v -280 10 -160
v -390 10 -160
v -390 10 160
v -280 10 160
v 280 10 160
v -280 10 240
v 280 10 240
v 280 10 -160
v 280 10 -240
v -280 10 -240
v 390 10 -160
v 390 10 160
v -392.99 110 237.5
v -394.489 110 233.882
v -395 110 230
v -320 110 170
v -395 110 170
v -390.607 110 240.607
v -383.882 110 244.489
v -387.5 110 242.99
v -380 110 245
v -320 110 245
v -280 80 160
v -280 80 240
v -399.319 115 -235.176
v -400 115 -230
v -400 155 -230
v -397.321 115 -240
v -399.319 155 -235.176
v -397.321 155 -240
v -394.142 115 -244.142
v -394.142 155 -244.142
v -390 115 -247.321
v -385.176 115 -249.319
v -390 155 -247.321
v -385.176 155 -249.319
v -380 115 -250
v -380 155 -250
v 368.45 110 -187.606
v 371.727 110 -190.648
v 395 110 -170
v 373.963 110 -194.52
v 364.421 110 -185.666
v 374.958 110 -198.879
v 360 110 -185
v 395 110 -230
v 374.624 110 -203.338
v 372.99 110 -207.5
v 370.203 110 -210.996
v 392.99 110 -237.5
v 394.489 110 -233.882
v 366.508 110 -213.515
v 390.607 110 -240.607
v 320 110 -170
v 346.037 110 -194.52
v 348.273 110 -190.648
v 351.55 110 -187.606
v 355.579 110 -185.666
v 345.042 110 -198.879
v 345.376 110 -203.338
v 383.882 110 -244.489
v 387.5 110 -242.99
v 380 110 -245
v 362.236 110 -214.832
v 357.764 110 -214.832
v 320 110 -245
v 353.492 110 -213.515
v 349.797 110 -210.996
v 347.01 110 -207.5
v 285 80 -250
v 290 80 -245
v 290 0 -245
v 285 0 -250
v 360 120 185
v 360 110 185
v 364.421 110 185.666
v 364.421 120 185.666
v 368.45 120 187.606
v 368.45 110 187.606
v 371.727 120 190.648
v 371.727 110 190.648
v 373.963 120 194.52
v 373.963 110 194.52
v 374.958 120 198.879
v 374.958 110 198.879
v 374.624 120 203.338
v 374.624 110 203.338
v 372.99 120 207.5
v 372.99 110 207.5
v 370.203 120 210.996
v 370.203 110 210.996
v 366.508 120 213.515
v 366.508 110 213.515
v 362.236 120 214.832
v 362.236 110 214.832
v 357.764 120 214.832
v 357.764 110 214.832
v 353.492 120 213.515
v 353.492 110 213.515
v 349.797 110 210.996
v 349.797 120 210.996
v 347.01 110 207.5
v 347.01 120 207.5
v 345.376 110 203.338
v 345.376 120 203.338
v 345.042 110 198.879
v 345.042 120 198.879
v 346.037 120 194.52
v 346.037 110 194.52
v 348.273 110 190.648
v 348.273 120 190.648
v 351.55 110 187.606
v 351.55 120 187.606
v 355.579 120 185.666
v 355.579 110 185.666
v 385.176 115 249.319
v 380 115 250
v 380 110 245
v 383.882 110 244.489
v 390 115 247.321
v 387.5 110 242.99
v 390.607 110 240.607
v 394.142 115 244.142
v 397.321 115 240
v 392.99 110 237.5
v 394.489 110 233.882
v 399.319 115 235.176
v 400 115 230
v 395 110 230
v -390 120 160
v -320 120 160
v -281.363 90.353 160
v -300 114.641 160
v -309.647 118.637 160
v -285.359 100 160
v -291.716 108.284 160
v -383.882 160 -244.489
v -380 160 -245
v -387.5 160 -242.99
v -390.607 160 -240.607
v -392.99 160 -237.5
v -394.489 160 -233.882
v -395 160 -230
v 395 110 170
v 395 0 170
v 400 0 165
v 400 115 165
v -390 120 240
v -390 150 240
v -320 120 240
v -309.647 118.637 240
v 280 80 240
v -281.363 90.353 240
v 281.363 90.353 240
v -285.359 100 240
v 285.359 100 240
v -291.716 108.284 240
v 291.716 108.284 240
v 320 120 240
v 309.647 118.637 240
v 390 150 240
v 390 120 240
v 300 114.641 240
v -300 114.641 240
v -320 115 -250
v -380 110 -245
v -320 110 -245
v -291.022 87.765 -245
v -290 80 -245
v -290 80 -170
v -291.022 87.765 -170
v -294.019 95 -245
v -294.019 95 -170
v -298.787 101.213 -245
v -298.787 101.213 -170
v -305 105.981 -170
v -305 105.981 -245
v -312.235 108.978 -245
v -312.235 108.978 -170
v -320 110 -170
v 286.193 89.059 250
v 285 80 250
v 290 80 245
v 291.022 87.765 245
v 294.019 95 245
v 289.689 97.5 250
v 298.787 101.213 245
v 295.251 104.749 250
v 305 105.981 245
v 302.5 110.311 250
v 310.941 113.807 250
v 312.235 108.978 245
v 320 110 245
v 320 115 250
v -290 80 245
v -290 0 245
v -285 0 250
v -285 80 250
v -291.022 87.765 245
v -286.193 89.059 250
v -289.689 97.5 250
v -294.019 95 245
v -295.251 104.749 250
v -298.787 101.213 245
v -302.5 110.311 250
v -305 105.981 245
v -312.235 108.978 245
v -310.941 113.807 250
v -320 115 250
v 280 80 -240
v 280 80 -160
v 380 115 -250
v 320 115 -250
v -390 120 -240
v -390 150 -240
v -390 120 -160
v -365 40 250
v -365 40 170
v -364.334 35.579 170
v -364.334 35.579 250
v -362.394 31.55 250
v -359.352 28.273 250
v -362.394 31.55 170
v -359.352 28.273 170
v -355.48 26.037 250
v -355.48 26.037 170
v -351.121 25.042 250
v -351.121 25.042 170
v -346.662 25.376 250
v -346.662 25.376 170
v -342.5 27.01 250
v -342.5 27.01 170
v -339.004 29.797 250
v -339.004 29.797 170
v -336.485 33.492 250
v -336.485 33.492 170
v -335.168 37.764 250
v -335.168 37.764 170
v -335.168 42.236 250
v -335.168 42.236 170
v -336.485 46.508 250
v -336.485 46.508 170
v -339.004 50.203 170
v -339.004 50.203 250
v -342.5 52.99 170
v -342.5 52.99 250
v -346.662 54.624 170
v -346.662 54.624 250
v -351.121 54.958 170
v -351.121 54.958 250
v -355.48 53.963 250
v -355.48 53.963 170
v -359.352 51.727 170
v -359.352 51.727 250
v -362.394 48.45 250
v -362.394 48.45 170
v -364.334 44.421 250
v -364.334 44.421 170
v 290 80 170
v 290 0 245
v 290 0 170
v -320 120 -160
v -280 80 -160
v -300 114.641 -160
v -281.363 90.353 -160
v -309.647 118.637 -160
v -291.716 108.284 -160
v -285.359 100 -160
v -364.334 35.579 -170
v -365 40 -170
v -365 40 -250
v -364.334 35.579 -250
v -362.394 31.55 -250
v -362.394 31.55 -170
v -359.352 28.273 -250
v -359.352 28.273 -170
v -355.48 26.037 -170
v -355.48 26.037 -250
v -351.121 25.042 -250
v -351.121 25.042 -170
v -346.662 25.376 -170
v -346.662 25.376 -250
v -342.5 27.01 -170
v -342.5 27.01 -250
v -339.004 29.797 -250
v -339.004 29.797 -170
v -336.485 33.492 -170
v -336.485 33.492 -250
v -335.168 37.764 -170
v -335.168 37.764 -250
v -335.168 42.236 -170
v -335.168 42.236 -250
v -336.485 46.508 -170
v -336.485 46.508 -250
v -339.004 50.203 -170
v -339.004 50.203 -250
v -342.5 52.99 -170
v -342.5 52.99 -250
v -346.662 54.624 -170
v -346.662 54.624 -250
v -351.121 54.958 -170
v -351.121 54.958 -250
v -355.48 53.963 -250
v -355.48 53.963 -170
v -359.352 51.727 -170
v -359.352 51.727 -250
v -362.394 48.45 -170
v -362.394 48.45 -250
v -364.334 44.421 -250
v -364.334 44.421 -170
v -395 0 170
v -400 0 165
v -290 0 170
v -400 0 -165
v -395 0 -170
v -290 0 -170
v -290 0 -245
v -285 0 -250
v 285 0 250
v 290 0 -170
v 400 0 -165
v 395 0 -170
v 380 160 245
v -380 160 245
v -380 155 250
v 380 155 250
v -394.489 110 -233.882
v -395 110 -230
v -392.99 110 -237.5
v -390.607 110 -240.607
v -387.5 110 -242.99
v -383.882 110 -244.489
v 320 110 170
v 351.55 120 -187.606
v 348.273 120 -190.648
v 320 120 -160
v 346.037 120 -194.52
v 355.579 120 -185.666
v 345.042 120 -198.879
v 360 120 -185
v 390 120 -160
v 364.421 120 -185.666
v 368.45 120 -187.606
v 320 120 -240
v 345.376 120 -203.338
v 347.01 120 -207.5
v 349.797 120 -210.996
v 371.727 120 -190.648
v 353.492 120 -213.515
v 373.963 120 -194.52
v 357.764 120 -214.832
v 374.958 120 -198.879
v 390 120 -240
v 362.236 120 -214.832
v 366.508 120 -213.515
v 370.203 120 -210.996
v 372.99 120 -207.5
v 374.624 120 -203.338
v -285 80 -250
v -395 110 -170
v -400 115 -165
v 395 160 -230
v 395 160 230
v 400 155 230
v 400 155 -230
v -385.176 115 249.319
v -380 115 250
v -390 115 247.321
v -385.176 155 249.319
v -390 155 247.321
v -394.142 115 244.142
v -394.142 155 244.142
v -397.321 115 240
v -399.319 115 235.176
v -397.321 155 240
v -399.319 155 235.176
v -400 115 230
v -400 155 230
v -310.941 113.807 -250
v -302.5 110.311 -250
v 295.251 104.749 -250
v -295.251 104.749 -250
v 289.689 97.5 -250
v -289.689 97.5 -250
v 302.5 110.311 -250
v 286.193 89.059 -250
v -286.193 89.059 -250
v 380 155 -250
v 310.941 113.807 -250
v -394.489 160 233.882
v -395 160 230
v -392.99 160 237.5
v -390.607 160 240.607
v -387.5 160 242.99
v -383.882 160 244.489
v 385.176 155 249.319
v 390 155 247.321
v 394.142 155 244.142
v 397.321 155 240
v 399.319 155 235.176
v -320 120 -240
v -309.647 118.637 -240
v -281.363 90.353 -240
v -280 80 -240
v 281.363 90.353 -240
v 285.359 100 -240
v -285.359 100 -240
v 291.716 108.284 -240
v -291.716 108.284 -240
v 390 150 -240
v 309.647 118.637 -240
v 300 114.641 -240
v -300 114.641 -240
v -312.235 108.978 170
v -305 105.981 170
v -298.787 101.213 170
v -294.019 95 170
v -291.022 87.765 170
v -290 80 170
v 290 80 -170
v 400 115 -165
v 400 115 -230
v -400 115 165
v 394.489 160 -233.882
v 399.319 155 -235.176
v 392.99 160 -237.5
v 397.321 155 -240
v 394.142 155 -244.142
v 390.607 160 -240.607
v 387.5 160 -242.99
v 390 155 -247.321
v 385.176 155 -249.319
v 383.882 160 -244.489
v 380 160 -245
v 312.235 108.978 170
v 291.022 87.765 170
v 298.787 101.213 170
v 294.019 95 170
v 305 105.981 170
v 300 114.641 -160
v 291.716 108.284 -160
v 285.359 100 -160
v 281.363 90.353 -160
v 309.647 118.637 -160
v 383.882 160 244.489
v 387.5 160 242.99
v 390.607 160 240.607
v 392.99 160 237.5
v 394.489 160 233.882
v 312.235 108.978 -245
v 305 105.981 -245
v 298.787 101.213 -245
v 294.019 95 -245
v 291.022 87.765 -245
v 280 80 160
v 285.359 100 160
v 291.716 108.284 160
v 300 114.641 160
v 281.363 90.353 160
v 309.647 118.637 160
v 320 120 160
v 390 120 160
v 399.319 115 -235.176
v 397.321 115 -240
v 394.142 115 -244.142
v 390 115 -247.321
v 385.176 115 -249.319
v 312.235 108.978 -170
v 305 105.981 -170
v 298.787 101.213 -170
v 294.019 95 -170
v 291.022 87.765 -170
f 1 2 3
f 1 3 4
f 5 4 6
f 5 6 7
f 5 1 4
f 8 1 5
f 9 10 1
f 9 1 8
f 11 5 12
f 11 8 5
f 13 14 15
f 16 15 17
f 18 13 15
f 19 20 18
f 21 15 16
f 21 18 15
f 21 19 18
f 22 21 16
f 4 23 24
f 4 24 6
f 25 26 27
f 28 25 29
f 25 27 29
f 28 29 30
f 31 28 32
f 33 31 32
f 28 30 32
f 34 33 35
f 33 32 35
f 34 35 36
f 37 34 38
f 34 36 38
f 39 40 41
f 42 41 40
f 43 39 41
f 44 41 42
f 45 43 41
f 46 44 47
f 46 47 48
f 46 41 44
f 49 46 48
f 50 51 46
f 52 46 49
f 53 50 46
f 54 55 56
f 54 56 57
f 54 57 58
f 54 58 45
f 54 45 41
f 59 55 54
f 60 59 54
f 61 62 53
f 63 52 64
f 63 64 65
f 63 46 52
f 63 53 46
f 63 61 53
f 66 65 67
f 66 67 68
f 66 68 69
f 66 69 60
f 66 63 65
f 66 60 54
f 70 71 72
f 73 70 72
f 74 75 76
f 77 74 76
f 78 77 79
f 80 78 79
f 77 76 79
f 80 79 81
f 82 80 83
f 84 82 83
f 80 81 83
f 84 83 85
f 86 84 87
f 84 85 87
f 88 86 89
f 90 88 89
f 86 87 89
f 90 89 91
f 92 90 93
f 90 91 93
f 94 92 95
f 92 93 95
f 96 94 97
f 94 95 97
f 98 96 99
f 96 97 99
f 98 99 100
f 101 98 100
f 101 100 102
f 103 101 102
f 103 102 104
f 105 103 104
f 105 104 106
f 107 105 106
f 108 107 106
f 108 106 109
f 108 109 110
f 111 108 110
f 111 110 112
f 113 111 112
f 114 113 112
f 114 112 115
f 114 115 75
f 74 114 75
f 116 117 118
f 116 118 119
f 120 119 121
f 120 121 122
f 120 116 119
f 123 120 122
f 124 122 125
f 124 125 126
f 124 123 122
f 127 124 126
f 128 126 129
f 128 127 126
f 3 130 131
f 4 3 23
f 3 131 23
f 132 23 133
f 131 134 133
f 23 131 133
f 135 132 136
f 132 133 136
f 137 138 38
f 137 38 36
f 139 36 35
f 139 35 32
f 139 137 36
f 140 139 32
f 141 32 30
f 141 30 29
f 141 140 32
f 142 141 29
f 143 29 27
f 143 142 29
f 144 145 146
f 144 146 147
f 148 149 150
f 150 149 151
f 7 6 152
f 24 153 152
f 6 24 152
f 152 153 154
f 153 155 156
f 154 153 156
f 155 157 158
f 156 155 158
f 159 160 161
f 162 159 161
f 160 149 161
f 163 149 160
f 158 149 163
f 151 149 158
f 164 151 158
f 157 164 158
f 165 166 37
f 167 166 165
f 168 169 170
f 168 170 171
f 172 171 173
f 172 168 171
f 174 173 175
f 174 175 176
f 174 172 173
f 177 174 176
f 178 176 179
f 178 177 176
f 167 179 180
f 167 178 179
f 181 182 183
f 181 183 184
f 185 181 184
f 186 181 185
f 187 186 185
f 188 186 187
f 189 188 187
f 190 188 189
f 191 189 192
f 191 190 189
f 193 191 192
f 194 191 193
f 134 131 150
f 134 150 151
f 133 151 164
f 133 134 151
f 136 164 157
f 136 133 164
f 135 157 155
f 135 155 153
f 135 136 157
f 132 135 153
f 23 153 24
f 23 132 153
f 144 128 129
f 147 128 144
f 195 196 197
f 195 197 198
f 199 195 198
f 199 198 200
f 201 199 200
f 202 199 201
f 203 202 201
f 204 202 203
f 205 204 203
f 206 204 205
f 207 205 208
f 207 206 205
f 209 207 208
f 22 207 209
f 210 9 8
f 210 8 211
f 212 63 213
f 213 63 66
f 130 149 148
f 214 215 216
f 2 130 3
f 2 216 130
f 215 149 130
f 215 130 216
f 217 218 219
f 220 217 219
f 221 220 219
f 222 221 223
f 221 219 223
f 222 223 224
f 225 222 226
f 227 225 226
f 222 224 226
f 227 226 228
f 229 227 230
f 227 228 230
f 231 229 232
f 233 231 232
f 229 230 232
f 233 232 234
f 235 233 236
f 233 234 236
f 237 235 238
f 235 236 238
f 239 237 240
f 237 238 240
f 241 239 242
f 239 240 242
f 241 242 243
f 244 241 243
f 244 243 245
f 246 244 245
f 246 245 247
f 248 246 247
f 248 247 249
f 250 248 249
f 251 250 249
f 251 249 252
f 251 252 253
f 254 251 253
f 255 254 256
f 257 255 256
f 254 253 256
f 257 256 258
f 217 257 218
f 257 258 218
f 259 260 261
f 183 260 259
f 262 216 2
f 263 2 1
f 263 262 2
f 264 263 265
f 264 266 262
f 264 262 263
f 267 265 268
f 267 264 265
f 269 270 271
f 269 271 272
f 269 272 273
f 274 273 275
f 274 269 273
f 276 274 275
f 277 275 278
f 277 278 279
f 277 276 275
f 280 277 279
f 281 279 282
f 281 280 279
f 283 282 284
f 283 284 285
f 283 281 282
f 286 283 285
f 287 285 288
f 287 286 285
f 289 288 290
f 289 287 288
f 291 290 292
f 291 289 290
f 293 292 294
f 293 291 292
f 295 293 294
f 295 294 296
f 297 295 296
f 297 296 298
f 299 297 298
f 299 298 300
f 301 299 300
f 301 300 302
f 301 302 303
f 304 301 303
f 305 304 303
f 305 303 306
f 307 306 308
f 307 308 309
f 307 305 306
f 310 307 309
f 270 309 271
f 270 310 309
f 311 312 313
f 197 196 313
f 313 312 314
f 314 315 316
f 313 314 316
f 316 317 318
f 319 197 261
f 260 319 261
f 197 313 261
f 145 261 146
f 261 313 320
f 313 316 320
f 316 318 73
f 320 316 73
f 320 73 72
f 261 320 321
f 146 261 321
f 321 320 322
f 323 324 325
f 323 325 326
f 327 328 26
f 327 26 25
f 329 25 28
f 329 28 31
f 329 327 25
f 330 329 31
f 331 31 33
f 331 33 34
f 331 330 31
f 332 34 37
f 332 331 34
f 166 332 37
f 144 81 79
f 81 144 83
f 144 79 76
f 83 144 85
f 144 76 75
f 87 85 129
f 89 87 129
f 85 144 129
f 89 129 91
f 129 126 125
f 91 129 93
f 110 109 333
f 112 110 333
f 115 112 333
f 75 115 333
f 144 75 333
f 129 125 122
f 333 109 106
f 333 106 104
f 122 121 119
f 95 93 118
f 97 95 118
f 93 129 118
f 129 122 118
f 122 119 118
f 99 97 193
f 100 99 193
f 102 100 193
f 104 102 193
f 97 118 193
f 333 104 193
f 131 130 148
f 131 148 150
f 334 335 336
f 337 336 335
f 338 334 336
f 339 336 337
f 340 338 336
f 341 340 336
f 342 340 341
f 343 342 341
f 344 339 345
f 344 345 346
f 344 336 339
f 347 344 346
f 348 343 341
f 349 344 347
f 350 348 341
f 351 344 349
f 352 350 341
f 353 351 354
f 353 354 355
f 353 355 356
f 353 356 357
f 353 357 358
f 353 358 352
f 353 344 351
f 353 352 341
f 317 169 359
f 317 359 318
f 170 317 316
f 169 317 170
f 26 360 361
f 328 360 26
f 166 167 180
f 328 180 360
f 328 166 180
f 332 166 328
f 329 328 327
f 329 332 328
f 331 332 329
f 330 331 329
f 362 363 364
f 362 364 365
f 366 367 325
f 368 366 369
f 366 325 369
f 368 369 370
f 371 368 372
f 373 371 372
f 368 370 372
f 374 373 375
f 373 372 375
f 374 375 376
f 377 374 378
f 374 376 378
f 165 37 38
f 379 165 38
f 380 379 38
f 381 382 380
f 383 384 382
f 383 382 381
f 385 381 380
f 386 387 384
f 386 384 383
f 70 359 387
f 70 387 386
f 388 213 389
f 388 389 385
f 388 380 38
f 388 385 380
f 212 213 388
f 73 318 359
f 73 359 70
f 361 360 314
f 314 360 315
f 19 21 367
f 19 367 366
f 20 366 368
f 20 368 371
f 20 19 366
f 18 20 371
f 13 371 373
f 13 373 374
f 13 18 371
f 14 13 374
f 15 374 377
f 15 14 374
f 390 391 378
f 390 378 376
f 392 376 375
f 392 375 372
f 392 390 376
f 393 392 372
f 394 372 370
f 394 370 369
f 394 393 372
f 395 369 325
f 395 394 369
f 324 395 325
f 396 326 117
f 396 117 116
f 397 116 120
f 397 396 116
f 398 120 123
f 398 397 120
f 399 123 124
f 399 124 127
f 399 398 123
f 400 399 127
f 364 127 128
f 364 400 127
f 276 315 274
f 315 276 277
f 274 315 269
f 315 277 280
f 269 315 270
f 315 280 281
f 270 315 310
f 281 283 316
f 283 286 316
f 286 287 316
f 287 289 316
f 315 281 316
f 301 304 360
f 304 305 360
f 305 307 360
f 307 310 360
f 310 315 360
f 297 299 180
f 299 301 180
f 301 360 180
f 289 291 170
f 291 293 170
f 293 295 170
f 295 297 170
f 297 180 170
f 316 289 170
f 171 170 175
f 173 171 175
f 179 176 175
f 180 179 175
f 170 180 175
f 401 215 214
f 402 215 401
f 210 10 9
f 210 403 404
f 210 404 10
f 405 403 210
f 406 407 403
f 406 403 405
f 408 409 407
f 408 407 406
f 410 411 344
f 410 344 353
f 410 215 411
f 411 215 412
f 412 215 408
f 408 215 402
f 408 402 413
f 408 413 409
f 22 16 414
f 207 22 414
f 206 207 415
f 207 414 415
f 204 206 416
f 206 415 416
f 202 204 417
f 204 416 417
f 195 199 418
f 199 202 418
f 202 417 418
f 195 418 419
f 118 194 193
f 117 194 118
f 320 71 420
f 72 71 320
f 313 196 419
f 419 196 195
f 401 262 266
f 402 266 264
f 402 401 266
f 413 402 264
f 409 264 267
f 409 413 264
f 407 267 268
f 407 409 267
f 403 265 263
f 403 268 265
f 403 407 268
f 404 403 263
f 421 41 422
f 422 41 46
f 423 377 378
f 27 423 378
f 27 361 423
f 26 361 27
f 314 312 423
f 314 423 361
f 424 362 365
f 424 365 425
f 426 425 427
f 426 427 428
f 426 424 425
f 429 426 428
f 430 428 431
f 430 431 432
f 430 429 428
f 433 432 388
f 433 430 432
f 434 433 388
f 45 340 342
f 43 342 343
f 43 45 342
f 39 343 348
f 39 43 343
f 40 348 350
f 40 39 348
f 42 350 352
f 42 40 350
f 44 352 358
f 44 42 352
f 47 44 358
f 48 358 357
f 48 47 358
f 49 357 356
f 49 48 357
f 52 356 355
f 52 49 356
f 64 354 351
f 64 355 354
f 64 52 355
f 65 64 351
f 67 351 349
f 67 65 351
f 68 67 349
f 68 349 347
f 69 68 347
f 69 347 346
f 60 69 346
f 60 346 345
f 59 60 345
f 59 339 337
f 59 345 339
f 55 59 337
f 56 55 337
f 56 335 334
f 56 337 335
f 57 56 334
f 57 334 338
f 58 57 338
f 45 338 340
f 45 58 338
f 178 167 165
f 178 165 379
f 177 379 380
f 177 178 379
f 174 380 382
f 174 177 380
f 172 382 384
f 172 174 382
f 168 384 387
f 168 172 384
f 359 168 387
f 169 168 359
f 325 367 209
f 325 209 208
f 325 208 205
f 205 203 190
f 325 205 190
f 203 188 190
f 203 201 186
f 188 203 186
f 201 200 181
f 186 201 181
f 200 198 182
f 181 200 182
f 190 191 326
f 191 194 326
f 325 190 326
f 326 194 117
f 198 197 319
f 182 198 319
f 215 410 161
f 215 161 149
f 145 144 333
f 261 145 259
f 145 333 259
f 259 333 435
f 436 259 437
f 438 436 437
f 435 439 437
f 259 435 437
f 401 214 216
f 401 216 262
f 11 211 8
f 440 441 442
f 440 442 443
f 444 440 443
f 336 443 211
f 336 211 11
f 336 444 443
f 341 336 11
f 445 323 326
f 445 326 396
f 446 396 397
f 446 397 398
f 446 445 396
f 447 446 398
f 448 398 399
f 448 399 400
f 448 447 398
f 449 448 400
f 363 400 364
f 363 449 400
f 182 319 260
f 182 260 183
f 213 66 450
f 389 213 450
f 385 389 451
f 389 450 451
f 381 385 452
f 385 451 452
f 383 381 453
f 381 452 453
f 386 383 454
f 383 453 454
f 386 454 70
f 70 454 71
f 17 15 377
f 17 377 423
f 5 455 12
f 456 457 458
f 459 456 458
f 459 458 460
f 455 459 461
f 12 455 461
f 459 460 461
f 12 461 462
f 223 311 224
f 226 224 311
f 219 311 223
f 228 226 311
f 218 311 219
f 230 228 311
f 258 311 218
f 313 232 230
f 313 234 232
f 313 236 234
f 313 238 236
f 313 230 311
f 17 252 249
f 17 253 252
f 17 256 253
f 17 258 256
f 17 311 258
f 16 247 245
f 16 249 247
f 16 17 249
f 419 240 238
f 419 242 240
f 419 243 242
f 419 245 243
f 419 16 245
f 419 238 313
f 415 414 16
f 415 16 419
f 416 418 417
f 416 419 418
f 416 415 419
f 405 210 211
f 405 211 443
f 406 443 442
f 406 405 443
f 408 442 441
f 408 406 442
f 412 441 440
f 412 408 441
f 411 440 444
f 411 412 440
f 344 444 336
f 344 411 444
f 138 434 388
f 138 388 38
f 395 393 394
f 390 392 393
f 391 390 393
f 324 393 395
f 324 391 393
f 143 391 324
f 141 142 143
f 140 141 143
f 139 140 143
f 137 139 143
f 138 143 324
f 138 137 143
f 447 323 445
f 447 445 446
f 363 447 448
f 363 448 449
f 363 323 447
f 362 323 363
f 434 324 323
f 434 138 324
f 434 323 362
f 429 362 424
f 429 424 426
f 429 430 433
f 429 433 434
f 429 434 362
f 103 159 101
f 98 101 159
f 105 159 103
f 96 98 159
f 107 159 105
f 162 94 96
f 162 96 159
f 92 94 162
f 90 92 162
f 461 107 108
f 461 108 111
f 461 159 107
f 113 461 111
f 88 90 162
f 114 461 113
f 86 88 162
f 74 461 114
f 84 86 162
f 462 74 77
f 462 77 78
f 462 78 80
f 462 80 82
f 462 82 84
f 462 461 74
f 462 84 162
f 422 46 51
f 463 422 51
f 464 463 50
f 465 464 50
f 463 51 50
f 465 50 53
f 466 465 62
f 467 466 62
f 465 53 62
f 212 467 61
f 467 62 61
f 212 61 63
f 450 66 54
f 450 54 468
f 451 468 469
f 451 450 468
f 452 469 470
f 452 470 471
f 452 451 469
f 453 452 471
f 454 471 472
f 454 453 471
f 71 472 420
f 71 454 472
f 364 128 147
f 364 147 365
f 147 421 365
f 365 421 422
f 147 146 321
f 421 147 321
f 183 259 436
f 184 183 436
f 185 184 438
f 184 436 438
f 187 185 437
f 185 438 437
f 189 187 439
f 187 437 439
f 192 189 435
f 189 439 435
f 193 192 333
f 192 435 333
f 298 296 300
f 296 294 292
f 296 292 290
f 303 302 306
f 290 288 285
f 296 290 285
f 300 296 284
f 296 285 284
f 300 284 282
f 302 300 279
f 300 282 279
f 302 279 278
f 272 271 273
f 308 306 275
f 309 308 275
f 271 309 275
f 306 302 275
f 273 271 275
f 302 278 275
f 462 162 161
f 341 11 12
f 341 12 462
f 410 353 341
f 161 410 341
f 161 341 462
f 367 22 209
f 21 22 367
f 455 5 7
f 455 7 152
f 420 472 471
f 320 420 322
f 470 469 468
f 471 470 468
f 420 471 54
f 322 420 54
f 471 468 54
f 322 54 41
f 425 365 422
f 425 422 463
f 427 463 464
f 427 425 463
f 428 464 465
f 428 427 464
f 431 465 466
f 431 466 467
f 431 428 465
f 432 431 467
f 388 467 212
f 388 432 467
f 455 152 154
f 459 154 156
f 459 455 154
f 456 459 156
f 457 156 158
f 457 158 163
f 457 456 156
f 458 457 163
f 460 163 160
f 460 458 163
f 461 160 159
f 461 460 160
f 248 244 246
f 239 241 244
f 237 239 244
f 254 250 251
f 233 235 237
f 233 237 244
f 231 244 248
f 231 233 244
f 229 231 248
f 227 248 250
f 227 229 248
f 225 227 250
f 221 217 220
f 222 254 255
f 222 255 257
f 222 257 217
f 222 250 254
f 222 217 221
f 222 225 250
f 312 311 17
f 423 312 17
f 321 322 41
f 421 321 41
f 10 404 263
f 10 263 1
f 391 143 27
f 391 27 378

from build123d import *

# Parameters (mm, degrees)
SKETCH1_W            = 800
SKETCH1_H            = 500
BOSS_EXTRUDE1_DEPTH  = 160
SKETCH3_W            = 110
SKETCH3_H            = 110
CUT_EXTRUDE1_DEPTH   = 80
FILLET1_R            = 30
FILLET1_OF_MIRROR1_R = 30
MIRROR2_START        = -250
MIRROR2_DEPTH        = 80
SHELL2_START         = -240
SHELL2_DEPTH         = 480
SHELL2_START_2       = -160
SHELL2_2_DEPTH       = 320
FILLET2_R            = 20
CHAMFER1_SIZE        = 5
CHAMFER2_SIZE        = 5
SKETCH7_R            = 15
BOSS_EXTRUDE2_DEPTH  = 80
SKETCH8_R            = 15
CUT_EXTRUDE2_DEPTH   = 20


# Read off the part's stored shape, not the designer's step: Mirror2, Shell2
with BuildPart() as part:
    # Sketch1 → Boss-Extrude1 (new body)
    with BuildSketch(Plane(origin=(0, 0, 0), x_dir=(1, 0, 0), z_dir=(0, 1, 0))):
        Rectangle(SKETCH1_W, SKETCH1_H)
    extrude(amount=BOSS_EXTRUDE1_DEPTH)

    # Sketch3 → Cut-Extrude1 (cut)
    with BuildSketch(Plane.XY.offset(250)):
        with Locations((-345, 55)):
            Rectangle(SKETCH3_W, SKETCH3_H)
    cut_extrude1 = extrude(amount=-CUT_EXTRUDE1_DEPTH, mode=Mode.SUBTRACT)

    # Fillet1
    fillet1_edges = [part.edges().sort_by_distance(p)[0] for p in [
        (-290, 110, 210),
    ]]
    fillet(fillet1_edges, radius=FILLET1_R)

    # Mirror1: Cut-Extrude1 across plane
    add(cut_extrude1.mirror(Plane(origin=(0, 0, 0), x_dir=(0, 0, 1), z_dir=(1, 0, 0))), mode=Mode.SUBTRACT)

    # Fillet1 of Mirror1
    fillet1_of_mirror1_edges = [part.edges().sort_by_distance(p)[0] for p in [
        (290, 110, 210),
    ]]
    fillet(fillet1_of_mirror1_edges, radius=FILLET1_OF_MIRROR1_R)

    # Mirror2 outline → Mirror2 (cut)
    with BuildSketch(Plane.XY.offset(MIRROR2_START)):
        with BuildLine():
            Line((400, 0), (400, 110))
            Line((400, 110), (320, 110))
            ThreePointArc((320, 110), (298.786796564, 101.213203436), (290, 80))
            Line((290, 80), (290, 0))
            Line((290, 0), (400, 0))
        make_face()
        with BuildLine():
            Line((-400, 0), (-290, 0))
            Line((-290, 0), (-290, 80))
            ThreePointArc((-290, 80), (-298.786796564, 101.213203436), (-320, 110))
            Line((-320, 110), (-400, 110))
            Line((-400, 110), (-400, 0))
        make_face()
    extrude(amount=MIRROR2_DEPTH, mode=Mode.SUBTRACT)

    # Shell2 outline → Shell2 (cut)
    with BuildSketch(Plane.XY.offset(SHELL2_START)):
        with BuildLine():
            Line((-280, 10), (280, 10))
            Line((280, 10), (280, 80))
            ThreePointArc((280, 80), (291.715728753, 108.284271247), (320, 120))
            Line((320, 120), (390, 120))
            Line((390, 120), (390, 150))
            Line((390, 150), (-390, 150))
            Line((-390, 150), (-390, 120))
            Line((-390, 120), (-320, 120))
            ThreePointArc((-320, 120), (-291.715728753, 108.284271247), (-280, 80))
            Line((-280, 80), (-280, 10))
        make_face()
    extrude(amount=SHELL2_DEPTH, mode=Mode.SUBTRACT)

    # Shell2 2 outline → Shell2 2 (cut)
    with BuildSketch(Plane.XY.offset(SHELL2_START_2)):
        with BuildLine():
            Line((280, 10), (390, 10))
            Line((390, 10), (390, 120))
            Line((390, 120), (320, 120))
            ThreePointArc((320, 120), (291.715728753, 108.284271247), (280, 80))
            Line((280, 80), (280, 10))
        make_face()
        with BuildLine():
            Line((-390, 10), (-280, 10))
            Line((-280, 10), (-280, 80))
            ThreePointArc((-280, 80), (-291.715728753, 108.284271247), (-320, 120))
            Line((-320, 120), (-390, 120))
            Line((-390, 120), (-390, 10))
        make_face()
    extrude(amount=SHELL2_2_DEPTH, mode=Mode.SUBTRACT)

    # Fillet2
    fillet2_edges = [part.edges().sort_by_distance(p)[0] for p in [
        (400, 135, 250),
        (-400, 135, 250),
        (-400, 135, -250),
        (400, 135, -250),
    ]]
    fillet(fillet2_edges, radius=FILLET2_R)

    # Chamfer1
    chamfer1_edges = [part.edges().sort_by_distance(p)[0] for p in [
        (-394.142135624, 110, 244.142135624),
        (394.142135624, 110, 244.142135624),
        (394.142135624, 110, -244.142135624),
        (-394.142135624, 110, -244.142135624),
        (-400, 55, 170),
        (-400, 110, 200),
        (-290, 40, 250),
        (-350, 110, 250),
        (-298.786796564, 101.213203436, 250),
        (400, 110, 200),
        (290, 40, 250),
        (400, 55, 170),
        (350, 110, 250),
        (298.786796564, 101.213203436, 250),
        (400, 55, -170),
        (400, 110, -200),
        (290, 40, -250),
        (350, 110, -250),
        (298.786796564, 101.213203436, -250),
        (-400, 110, -200),
        (-290, 40, -250),
        (-400, 55, -170),
        (-350, 110, -250),
        (-298.786796564, 101.213203436, -250),
    ]]
    chamfer(chamfer1_edges, length=CHAMFER1_SIZE)

    # Chamfer2
    chamfer2_edges = [part.edges().sort_by_distance(p)[0] for p in [
        (0, 160, 250),
        (-400, 160, 0),
        (400, 160, 0),
        (0, 160, -250),
        (-394.142135624, 160, -244.142135624),
        (394.142135624, 160, -244.142135624),
        (394.142135624, 160, 244.142135624),
        (-394.142135624, 160, 244.142135624),
    ]]
    chamfer(chamfer2_edges, length=CHAMFER2_SIZE)

    # Sketch7 → Boss-Extrude2 (add)
    with BuildSketch(Plane.XY.offset(170)):
        with Locations(Location((-350, 40, 0), (0, 0, 180))):
            Circle(SKETCH7_R)
    boss_extrude2 = extrude(amount=BOSS_EXTRUDE2_DEPTH)

    # Mirror3: Boss-Extrude2 across plane
    add(boss_extrude2.mirror(Plane.XY))

    # Sketch8 → Cut-Extrude2 (cut)
    with BuildSketch(Plane.XZ.offset(-110)):
        with Locations(Location((360, 200, 0), (0, 0, 270))):
            Circle(SKETCH8_R)
    cut_extrude2 = extrude(amount=-CUT_EXTRUDE2_DEPTH, mode=Mode.SUBTRACT)

    # Mirror4: Cut-Extrude2 across plane
    add(cut_extrude2.mirror(Plane.XY), mode=Mode.SUBTRACT)


solid = part.part
